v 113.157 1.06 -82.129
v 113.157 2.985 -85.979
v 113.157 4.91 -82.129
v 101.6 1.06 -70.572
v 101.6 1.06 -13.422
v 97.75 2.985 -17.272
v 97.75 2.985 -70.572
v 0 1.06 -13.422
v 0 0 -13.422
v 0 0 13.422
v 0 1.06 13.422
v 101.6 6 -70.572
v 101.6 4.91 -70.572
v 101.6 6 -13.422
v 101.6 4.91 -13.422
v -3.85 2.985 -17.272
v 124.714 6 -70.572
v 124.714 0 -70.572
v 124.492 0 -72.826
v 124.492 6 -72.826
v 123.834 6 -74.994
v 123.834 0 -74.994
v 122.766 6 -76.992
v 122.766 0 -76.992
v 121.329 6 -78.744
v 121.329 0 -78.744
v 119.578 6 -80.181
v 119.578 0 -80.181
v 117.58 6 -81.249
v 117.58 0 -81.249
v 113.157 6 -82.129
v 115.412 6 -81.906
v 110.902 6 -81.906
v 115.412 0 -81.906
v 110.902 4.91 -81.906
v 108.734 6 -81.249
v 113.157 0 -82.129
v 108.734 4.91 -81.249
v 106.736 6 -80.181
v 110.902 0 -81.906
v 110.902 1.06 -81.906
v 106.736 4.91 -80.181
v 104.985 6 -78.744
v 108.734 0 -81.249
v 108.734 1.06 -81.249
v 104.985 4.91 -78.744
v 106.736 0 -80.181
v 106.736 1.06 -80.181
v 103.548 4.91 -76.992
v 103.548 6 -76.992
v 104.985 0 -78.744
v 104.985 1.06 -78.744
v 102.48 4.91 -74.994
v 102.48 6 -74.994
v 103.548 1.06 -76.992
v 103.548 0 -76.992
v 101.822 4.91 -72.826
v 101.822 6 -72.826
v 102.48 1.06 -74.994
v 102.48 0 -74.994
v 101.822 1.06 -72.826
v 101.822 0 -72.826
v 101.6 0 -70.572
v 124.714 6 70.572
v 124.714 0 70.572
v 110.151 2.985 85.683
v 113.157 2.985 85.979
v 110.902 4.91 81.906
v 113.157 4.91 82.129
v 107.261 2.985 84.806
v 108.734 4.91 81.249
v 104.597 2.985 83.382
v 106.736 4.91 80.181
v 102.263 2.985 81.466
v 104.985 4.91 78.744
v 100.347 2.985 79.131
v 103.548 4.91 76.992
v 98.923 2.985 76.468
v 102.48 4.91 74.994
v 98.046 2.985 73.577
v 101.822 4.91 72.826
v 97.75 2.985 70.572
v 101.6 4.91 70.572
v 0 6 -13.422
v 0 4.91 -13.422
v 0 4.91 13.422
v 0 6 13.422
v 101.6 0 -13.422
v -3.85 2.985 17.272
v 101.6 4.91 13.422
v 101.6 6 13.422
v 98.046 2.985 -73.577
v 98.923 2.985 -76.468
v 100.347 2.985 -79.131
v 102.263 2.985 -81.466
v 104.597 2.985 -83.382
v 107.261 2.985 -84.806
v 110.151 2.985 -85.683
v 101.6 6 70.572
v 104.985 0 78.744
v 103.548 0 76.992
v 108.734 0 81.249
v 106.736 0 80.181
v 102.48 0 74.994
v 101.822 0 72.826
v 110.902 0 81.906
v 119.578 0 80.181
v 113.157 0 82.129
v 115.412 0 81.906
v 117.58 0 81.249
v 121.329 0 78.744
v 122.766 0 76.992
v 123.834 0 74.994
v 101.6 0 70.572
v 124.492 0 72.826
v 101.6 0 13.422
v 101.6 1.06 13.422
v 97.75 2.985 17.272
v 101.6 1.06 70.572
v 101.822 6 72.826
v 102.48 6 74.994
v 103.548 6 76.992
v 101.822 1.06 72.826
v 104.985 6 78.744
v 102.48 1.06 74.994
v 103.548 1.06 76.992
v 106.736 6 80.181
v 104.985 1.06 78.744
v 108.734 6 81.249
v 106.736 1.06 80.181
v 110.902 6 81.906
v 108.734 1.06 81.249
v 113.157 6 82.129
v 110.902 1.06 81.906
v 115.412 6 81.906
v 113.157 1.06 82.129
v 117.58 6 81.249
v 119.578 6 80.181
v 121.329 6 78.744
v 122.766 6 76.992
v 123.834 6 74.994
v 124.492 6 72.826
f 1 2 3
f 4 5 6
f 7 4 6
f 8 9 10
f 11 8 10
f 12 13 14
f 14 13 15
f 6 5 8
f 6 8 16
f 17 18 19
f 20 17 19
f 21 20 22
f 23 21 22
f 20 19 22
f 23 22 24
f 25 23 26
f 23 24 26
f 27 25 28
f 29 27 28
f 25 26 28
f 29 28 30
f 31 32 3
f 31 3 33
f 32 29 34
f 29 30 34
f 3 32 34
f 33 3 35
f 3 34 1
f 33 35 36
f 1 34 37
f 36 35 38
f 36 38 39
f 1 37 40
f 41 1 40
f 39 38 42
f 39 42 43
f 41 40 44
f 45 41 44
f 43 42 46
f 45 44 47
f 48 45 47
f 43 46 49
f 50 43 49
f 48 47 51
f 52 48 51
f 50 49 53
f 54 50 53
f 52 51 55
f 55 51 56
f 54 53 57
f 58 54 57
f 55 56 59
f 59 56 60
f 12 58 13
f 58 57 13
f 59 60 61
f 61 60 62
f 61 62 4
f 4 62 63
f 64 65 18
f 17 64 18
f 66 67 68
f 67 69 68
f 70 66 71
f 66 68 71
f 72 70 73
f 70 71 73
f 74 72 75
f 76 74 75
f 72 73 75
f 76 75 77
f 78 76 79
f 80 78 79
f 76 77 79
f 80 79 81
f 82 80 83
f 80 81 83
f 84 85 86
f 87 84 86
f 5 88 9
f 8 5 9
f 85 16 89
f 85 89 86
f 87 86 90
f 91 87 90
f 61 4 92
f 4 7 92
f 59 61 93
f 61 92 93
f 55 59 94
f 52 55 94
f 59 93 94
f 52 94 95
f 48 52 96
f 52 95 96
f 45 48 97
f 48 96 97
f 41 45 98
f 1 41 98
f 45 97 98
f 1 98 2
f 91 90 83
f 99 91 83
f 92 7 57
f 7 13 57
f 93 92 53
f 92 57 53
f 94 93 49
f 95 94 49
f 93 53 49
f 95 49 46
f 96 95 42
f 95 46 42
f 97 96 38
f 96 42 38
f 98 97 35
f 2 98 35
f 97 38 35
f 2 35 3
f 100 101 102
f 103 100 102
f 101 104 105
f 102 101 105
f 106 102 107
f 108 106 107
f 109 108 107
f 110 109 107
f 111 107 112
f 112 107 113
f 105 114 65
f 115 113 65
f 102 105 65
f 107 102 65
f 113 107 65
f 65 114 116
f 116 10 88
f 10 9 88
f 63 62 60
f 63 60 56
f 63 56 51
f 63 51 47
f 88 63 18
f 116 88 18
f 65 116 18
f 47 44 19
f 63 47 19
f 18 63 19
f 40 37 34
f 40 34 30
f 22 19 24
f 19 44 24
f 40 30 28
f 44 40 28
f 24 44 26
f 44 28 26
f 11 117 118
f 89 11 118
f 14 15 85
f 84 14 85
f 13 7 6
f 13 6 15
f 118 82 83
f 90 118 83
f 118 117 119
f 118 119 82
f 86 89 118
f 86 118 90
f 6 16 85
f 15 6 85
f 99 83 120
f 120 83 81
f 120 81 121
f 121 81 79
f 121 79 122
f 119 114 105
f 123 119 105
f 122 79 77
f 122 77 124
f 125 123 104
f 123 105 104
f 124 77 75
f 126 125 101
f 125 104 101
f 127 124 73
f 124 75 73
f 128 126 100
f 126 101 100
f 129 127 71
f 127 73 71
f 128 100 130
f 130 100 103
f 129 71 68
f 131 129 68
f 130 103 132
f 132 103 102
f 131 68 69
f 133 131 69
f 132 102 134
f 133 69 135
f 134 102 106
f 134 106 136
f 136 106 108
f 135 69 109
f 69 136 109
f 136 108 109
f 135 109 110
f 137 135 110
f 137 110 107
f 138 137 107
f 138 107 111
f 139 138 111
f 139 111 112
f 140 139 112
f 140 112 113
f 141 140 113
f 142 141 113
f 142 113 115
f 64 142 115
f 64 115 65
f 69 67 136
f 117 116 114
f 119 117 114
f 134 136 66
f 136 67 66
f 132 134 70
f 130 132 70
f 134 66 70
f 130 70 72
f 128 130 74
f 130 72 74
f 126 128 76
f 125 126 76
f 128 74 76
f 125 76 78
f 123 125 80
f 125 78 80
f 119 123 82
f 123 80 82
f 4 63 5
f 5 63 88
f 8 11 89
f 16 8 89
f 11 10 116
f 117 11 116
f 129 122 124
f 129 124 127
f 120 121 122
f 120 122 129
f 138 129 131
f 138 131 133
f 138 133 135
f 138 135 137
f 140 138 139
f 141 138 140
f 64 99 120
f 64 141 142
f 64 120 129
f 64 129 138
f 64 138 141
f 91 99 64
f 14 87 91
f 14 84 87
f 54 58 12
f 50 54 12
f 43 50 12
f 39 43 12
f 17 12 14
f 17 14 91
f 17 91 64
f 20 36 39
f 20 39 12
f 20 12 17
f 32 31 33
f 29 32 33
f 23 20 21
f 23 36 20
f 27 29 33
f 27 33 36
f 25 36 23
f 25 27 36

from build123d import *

# Parameters (mm, degrees)
BOSS_EXTRUDE1_DEPTH = 6


with BuildPart() as part:
    # Sketch1 → Boss-Extrude1 (new body)
    with BuildSketch(Plane(origin=(0, 0, 0), x_dir=(1, 0, 0), z_dir=(0, 1, 0))):
        with BuildLine():
            Line((0, -13.421553628), (101.6, -13.421553628))
            Line((101.6, -13.421553628), (101.6, -70.571553628))
            ThreePointArc((101.6, -70.571553628), (113.157, -82.128553628), (124.714, -70.571553628))
            Line((124.714, -70.571553628), (124.714, 70.571553628))
            ThreePointArc((124.714, 70.571553628), (113.157, 82.128553628), (101.6, 70.571553628))
            Line((101.6, 70.571553628), (101.6, 13.421553628))
            Line((101.6, 13.421553628), (0, 13.421553628))
            Line((0, 13.421553628), (0, -13.421553628))
        make_face()
    extrude(amount=BOSS_EXTRUDE1_DEPTH)

    # Sweep1: sweep along a curve in space
    with BuildLine() as sweep1_path:
        ThreePointArc((113.157, 3, 82.128553628), (104.98496693, 3, 78.743586698), (101.6, 3, 70.571553628))
        Line((101.6, 3, 70.571553628), (101.6, 3, 13.421553628))
        Line((101.6, 3, 13.421553628), (0, 3, 13.421553628))
        Line((0, 3, 13.421553628), (0, 3, -13.421553628))
        Line((0, 3, -13.421553628), (101.6, 3, -13.421553628))
        Line((101.6, 3, -13.421553628), (101.6, 3, -70.571553628))
        ThreePointArc((101.6, 3, -70.571553628), (104.98496693, 3, -78.743586698), (113.157, 3, -82.128553628))
    # Sketch4 → Sweep1 (sweep)
    with BuildSketch(Plane(origin=(113.157, 0, 0), x_dir=(0, 0, -1), z_dir=(1, 0, 0))):
        Polygon((82.128553628, 4.910343042), (82.128553628, 1.060343042), (85.978553628, 2.985343042), align=None)
    sweep(path=sweep1_path.line, transition=Transition.RIGHT)


solid = part.part
